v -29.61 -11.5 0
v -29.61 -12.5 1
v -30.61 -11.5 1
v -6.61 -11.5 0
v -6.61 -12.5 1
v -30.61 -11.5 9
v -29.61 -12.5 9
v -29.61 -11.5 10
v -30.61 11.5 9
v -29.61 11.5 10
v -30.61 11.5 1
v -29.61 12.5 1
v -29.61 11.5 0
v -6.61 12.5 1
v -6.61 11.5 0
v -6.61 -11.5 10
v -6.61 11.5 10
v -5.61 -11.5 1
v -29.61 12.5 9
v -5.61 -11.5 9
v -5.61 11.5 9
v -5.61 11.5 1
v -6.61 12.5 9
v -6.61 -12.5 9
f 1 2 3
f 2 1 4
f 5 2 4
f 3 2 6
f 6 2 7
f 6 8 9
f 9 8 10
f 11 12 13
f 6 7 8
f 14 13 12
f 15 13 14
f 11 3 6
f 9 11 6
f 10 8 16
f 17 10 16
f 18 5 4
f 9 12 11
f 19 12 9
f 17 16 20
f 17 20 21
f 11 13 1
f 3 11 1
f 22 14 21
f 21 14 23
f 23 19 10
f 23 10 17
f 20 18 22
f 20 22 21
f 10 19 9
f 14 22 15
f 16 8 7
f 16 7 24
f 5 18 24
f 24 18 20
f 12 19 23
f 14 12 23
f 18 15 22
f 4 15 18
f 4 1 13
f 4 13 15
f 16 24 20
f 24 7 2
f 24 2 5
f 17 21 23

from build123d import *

# Parameters (mm, degrees)
F0_W     = 25
F0_H     = 10
F1_DEPTH = 12.5
F2_SIZE  = 1


with BuildPart() as f1:
    # F0 (on Front) → F1 (new body, symmetric)
    with BuildSketch(Plane.XZ):
        with Locations((-18.109543, 5)):
            Rectangle(F0_W, F0_H)
    extrude(amount=F1_DEPTH, both=True)

    # F2
    f2_edges = [f1.edges().sort_by_distance(p)[0] for p in [
        (-30.609543, -12.5, 5),
        (-5.609543, -12.5, 5),
        (-18.109543, -12.5, 10),
        (-18.109543, -12.5, 0),
        (-5.609543, 0, 0),
        (-5.609543, 0, 10),
        (-5.609543, 12.5, 5),
        (-30.609543, 12.5, 5),
        (-18.109543, 12.5, 10),
        (-18.109543, 12.5, 0),
        (-30.609543, 0, 10),
        (-30.609543, 0, 0),
    ]]
    chamfer(f2_edges, length=F2_SIZE)


solid = f1.part
